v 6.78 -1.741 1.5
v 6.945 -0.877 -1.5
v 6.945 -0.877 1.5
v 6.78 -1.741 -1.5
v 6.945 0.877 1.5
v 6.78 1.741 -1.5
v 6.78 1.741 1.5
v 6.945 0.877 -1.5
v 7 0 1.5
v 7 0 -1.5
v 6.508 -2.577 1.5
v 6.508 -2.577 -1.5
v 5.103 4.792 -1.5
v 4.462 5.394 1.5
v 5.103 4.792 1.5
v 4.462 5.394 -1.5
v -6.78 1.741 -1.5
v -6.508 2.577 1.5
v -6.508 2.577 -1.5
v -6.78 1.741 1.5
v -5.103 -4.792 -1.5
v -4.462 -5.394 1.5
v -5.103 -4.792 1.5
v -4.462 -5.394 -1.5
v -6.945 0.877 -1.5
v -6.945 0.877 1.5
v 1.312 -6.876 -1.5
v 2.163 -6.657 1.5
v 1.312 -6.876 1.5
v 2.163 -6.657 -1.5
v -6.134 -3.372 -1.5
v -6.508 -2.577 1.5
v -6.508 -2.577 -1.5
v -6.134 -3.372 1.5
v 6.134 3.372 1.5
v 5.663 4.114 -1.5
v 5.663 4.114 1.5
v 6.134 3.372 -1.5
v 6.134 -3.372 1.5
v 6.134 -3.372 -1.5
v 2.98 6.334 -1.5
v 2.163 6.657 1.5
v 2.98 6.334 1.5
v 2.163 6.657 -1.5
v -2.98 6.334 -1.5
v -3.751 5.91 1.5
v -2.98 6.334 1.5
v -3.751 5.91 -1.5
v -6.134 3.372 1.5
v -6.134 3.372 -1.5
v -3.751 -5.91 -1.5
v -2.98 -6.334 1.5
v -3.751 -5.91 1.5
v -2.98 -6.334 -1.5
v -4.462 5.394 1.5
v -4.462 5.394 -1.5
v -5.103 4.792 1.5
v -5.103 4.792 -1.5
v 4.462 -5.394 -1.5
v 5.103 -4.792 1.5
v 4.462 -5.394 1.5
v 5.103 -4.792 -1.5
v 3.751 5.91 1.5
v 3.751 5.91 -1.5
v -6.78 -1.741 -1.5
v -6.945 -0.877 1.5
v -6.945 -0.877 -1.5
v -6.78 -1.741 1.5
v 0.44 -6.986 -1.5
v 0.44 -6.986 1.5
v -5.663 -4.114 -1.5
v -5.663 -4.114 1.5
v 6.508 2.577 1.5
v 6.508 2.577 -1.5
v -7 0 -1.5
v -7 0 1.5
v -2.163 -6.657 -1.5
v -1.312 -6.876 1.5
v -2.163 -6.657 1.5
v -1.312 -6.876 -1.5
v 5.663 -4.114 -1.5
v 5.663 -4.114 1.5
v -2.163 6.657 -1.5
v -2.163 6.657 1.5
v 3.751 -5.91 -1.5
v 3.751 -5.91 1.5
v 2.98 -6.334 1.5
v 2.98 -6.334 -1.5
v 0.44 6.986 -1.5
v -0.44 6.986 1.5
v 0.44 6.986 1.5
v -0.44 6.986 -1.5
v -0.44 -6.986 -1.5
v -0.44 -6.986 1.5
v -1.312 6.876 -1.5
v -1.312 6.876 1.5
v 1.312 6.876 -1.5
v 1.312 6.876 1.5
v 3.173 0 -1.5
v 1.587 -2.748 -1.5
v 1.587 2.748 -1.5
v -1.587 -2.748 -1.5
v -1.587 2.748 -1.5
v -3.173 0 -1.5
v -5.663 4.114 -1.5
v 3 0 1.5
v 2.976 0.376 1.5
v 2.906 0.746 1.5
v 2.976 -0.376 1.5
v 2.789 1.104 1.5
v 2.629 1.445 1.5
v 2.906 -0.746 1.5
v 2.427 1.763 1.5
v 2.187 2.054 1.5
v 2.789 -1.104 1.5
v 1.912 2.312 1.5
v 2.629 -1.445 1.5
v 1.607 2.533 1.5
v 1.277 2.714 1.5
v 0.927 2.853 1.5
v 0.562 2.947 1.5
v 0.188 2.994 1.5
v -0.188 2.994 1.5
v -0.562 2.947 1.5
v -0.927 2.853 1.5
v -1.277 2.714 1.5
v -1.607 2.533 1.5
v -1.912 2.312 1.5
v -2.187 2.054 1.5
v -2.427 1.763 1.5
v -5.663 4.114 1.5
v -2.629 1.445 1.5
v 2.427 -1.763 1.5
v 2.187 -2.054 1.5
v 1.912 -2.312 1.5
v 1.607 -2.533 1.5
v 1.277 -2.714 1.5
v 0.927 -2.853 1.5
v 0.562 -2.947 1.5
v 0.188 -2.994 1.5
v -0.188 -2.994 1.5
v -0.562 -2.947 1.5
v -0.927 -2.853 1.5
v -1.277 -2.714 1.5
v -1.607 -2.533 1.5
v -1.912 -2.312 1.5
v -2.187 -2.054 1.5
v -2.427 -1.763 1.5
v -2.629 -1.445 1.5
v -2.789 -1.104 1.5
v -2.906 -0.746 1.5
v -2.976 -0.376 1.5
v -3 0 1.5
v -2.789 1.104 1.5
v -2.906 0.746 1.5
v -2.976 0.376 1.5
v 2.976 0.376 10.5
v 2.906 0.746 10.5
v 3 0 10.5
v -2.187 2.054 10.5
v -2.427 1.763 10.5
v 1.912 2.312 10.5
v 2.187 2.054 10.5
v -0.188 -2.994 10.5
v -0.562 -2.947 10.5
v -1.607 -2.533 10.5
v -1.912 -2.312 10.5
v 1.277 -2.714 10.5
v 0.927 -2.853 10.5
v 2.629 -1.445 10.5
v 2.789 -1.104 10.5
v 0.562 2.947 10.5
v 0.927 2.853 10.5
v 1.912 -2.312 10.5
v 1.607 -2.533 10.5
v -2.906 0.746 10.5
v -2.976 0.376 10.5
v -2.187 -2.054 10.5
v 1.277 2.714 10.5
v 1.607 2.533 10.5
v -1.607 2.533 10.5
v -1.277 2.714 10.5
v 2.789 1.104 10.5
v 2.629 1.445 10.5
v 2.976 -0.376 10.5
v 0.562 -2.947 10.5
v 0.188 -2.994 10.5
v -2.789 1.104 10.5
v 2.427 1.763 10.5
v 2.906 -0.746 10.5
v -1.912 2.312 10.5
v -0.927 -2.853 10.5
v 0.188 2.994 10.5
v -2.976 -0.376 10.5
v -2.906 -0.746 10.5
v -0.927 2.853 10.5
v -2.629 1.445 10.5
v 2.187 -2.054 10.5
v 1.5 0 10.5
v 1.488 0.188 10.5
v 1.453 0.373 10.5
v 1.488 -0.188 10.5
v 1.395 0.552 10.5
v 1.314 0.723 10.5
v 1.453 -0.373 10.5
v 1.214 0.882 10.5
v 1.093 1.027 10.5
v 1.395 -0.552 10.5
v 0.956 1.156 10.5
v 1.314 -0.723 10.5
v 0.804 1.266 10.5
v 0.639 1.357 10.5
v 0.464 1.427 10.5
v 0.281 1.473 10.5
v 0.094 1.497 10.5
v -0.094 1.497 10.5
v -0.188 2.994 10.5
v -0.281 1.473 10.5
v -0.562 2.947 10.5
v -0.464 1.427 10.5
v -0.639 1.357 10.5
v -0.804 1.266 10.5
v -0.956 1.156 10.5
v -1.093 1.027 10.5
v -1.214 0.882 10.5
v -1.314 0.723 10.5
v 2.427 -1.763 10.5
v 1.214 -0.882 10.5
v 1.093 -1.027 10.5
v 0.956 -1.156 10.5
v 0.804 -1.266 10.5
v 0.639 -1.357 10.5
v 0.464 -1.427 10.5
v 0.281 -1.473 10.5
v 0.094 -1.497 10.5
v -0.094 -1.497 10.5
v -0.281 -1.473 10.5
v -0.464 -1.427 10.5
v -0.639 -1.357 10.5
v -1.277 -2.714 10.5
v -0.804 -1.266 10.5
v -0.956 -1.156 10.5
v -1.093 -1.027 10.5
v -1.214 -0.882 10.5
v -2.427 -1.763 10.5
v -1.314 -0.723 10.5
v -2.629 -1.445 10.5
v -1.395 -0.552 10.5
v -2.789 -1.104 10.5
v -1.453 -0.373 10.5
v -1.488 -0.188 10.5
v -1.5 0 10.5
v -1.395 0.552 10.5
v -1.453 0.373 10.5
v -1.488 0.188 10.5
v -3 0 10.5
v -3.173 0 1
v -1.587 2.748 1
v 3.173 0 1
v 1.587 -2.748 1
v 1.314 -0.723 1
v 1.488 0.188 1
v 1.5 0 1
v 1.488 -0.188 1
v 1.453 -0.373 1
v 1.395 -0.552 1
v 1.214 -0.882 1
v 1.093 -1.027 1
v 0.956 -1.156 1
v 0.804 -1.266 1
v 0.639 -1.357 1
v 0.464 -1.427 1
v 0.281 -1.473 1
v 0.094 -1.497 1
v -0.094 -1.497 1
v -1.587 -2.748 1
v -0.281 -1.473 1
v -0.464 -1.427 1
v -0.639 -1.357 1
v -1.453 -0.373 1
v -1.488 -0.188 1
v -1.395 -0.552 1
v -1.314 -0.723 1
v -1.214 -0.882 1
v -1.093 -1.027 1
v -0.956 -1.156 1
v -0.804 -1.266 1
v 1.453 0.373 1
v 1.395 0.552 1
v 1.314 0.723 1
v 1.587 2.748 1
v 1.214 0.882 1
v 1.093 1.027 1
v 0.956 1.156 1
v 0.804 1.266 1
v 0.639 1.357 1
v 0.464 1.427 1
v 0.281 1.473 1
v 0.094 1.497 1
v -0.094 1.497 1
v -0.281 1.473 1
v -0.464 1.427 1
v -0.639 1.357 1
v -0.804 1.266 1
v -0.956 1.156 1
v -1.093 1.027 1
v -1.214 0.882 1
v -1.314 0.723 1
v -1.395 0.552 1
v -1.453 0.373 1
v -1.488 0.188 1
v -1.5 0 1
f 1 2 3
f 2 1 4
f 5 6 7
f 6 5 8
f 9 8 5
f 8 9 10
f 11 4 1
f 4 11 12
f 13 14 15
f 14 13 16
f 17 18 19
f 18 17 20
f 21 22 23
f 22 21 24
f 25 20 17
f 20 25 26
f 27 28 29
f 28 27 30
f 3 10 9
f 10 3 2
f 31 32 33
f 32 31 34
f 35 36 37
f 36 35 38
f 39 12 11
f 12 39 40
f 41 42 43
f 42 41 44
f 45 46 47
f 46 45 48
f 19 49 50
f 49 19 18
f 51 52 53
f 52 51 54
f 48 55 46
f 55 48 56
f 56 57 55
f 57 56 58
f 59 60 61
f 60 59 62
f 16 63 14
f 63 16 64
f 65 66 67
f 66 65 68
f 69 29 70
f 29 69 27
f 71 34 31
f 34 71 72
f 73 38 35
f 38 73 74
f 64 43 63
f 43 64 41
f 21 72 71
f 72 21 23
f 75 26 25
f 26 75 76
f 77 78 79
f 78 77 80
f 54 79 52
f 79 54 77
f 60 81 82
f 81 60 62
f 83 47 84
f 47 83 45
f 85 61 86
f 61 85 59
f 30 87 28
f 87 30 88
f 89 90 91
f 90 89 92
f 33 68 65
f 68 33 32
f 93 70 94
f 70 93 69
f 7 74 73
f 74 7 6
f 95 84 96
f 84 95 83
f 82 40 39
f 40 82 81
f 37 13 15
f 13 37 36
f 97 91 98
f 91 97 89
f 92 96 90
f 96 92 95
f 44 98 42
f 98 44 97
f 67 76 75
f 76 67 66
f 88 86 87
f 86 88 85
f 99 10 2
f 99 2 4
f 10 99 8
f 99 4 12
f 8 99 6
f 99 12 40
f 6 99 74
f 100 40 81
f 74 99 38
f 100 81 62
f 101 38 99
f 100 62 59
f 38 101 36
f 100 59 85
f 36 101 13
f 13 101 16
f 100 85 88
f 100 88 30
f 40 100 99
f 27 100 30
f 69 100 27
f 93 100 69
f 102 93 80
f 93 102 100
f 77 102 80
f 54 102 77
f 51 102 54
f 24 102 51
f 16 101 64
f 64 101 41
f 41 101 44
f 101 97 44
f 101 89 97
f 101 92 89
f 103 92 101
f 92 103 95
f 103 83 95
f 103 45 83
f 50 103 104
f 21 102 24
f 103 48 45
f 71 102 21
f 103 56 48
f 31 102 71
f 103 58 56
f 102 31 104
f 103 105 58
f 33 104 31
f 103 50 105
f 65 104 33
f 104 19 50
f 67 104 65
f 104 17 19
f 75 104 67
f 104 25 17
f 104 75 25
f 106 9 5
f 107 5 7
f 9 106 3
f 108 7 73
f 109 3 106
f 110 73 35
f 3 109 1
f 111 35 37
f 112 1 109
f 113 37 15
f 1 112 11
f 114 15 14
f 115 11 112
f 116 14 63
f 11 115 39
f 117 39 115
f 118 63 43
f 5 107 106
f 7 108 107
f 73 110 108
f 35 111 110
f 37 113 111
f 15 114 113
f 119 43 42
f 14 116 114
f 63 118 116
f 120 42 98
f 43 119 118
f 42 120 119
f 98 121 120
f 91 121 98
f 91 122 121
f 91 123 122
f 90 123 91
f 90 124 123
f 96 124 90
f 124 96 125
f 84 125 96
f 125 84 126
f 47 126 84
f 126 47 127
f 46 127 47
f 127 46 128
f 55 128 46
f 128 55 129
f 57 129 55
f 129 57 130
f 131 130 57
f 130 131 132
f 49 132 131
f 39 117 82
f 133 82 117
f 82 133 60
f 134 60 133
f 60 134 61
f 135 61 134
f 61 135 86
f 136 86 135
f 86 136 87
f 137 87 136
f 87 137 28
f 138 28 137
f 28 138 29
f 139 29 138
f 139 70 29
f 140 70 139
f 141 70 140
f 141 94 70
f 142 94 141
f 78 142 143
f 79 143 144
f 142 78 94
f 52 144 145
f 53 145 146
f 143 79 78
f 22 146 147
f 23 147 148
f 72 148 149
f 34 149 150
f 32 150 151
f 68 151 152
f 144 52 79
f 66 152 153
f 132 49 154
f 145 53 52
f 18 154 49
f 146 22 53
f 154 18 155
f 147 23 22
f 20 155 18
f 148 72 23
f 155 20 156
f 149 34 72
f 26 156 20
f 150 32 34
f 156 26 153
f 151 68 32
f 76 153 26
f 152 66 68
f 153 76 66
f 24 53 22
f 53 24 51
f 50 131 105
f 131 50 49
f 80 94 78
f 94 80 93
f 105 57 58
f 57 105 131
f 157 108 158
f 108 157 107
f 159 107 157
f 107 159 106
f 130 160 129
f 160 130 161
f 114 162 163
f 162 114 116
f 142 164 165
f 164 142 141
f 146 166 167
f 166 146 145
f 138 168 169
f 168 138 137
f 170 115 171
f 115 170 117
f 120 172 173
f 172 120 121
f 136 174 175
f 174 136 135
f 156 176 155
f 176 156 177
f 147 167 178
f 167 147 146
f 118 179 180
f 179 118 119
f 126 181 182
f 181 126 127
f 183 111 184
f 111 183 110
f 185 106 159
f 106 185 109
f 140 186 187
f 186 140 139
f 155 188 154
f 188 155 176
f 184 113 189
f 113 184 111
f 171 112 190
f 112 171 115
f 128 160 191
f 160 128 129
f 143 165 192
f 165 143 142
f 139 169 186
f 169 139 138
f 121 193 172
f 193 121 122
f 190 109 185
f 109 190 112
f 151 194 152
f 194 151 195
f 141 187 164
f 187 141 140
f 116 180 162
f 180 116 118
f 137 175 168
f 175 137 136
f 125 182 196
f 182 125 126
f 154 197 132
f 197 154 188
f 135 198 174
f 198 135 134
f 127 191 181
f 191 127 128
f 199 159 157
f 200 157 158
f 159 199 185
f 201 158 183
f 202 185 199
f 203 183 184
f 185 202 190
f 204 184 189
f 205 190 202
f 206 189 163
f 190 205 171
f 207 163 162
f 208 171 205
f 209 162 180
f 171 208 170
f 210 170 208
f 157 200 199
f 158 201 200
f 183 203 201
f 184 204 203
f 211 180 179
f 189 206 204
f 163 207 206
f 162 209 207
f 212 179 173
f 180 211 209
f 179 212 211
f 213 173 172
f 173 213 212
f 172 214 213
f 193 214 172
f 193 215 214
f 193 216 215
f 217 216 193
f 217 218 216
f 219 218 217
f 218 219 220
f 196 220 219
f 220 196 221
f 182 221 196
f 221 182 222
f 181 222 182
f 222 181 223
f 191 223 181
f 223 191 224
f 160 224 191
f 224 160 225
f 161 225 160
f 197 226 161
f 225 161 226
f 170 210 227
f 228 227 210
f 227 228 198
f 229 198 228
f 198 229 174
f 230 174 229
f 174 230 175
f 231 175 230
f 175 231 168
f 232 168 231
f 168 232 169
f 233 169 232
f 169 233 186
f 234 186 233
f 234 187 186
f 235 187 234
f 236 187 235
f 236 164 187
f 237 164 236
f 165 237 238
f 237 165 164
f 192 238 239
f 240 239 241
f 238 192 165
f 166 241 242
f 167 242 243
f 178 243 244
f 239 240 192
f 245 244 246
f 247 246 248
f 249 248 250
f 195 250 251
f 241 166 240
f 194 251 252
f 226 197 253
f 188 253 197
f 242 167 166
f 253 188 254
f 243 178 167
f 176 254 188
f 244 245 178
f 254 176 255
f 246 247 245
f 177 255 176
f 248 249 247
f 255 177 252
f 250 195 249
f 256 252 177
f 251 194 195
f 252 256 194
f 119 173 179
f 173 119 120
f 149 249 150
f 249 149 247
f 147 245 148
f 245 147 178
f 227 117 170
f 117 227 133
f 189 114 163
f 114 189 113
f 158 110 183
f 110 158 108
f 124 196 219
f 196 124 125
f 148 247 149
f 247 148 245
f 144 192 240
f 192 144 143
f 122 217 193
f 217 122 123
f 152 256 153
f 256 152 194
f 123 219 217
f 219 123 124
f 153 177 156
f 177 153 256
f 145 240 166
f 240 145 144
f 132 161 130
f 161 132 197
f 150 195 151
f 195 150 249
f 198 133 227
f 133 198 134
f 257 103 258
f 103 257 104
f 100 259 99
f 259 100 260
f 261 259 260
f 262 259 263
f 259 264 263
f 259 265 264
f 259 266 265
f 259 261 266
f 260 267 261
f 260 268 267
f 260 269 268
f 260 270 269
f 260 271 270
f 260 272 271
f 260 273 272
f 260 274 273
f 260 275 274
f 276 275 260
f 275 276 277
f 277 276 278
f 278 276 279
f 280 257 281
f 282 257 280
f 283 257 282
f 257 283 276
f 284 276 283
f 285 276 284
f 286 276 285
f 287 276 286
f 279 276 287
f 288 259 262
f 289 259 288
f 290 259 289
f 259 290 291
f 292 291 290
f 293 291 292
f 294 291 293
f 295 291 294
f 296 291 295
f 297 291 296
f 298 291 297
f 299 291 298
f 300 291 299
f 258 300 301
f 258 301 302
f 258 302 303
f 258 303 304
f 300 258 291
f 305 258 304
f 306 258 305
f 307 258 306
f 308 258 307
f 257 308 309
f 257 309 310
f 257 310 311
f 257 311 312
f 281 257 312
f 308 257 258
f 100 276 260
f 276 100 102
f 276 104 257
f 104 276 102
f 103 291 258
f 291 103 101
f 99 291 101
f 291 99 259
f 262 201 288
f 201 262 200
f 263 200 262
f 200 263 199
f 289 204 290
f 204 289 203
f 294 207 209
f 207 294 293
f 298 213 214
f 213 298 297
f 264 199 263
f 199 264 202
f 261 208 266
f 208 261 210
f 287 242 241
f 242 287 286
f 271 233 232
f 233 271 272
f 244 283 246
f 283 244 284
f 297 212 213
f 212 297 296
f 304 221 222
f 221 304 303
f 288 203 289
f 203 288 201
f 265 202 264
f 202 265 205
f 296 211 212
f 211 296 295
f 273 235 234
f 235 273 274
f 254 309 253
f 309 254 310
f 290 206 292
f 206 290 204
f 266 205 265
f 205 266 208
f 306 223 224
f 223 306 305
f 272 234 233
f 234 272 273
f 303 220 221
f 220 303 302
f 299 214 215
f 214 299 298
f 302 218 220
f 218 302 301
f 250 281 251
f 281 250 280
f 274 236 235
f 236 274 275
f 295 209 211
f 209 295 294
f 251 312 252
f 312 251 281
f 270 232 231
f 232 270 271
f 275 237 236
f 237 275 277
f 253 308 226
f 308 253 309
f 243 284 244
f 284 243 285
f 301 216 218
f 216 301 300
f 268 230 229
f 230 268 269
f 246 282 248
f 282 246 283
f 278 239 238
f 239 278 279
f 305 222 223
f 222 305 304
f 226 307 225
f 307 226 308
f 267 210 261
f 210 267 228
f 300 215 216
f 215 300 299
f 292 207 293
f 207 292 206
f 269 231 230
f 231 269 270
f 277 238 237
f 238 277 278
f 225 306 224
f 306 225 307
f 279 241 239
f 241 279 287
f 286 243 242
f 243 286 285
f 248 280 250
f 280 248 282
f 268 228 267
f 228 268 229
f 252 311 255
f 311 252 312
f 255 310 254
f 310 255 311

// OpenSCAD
$fn = 50;


difference() {
	union() {
		translate(v = [0, 0, -1.5000000000]) {
			cylinder(h = 3, r = 7.0000000000);
		}
		translate(v = [0, 0, -1.5000000000]) {
			cylinder(h = 12, r = 3.0000000000);
		}
	}
	union() {
		translate(v = [0, 0, -1.5000000000]) {
			rotate(a = [0, 0, 0]) {
				difference() {
					union() {
						linear_extrude(height = 2.5000000000) {
							polygon(points = [[3.1735000000, 0.0000000000], [1.5867500000, 2.7483316189], [-1.5867500000, 2.7483316189], [-3.1735000000, 0.0000000000], [-1.5867500000, -2.7483316189], [1.5867500000, -2.7483316189]]);
						}
					}
					union();
				}
			}
		}
		translate(v = [0, 0, -100.0000000000]) {
			cylinder(h = 200, r = 1.5000000000);
		}
	}
}
